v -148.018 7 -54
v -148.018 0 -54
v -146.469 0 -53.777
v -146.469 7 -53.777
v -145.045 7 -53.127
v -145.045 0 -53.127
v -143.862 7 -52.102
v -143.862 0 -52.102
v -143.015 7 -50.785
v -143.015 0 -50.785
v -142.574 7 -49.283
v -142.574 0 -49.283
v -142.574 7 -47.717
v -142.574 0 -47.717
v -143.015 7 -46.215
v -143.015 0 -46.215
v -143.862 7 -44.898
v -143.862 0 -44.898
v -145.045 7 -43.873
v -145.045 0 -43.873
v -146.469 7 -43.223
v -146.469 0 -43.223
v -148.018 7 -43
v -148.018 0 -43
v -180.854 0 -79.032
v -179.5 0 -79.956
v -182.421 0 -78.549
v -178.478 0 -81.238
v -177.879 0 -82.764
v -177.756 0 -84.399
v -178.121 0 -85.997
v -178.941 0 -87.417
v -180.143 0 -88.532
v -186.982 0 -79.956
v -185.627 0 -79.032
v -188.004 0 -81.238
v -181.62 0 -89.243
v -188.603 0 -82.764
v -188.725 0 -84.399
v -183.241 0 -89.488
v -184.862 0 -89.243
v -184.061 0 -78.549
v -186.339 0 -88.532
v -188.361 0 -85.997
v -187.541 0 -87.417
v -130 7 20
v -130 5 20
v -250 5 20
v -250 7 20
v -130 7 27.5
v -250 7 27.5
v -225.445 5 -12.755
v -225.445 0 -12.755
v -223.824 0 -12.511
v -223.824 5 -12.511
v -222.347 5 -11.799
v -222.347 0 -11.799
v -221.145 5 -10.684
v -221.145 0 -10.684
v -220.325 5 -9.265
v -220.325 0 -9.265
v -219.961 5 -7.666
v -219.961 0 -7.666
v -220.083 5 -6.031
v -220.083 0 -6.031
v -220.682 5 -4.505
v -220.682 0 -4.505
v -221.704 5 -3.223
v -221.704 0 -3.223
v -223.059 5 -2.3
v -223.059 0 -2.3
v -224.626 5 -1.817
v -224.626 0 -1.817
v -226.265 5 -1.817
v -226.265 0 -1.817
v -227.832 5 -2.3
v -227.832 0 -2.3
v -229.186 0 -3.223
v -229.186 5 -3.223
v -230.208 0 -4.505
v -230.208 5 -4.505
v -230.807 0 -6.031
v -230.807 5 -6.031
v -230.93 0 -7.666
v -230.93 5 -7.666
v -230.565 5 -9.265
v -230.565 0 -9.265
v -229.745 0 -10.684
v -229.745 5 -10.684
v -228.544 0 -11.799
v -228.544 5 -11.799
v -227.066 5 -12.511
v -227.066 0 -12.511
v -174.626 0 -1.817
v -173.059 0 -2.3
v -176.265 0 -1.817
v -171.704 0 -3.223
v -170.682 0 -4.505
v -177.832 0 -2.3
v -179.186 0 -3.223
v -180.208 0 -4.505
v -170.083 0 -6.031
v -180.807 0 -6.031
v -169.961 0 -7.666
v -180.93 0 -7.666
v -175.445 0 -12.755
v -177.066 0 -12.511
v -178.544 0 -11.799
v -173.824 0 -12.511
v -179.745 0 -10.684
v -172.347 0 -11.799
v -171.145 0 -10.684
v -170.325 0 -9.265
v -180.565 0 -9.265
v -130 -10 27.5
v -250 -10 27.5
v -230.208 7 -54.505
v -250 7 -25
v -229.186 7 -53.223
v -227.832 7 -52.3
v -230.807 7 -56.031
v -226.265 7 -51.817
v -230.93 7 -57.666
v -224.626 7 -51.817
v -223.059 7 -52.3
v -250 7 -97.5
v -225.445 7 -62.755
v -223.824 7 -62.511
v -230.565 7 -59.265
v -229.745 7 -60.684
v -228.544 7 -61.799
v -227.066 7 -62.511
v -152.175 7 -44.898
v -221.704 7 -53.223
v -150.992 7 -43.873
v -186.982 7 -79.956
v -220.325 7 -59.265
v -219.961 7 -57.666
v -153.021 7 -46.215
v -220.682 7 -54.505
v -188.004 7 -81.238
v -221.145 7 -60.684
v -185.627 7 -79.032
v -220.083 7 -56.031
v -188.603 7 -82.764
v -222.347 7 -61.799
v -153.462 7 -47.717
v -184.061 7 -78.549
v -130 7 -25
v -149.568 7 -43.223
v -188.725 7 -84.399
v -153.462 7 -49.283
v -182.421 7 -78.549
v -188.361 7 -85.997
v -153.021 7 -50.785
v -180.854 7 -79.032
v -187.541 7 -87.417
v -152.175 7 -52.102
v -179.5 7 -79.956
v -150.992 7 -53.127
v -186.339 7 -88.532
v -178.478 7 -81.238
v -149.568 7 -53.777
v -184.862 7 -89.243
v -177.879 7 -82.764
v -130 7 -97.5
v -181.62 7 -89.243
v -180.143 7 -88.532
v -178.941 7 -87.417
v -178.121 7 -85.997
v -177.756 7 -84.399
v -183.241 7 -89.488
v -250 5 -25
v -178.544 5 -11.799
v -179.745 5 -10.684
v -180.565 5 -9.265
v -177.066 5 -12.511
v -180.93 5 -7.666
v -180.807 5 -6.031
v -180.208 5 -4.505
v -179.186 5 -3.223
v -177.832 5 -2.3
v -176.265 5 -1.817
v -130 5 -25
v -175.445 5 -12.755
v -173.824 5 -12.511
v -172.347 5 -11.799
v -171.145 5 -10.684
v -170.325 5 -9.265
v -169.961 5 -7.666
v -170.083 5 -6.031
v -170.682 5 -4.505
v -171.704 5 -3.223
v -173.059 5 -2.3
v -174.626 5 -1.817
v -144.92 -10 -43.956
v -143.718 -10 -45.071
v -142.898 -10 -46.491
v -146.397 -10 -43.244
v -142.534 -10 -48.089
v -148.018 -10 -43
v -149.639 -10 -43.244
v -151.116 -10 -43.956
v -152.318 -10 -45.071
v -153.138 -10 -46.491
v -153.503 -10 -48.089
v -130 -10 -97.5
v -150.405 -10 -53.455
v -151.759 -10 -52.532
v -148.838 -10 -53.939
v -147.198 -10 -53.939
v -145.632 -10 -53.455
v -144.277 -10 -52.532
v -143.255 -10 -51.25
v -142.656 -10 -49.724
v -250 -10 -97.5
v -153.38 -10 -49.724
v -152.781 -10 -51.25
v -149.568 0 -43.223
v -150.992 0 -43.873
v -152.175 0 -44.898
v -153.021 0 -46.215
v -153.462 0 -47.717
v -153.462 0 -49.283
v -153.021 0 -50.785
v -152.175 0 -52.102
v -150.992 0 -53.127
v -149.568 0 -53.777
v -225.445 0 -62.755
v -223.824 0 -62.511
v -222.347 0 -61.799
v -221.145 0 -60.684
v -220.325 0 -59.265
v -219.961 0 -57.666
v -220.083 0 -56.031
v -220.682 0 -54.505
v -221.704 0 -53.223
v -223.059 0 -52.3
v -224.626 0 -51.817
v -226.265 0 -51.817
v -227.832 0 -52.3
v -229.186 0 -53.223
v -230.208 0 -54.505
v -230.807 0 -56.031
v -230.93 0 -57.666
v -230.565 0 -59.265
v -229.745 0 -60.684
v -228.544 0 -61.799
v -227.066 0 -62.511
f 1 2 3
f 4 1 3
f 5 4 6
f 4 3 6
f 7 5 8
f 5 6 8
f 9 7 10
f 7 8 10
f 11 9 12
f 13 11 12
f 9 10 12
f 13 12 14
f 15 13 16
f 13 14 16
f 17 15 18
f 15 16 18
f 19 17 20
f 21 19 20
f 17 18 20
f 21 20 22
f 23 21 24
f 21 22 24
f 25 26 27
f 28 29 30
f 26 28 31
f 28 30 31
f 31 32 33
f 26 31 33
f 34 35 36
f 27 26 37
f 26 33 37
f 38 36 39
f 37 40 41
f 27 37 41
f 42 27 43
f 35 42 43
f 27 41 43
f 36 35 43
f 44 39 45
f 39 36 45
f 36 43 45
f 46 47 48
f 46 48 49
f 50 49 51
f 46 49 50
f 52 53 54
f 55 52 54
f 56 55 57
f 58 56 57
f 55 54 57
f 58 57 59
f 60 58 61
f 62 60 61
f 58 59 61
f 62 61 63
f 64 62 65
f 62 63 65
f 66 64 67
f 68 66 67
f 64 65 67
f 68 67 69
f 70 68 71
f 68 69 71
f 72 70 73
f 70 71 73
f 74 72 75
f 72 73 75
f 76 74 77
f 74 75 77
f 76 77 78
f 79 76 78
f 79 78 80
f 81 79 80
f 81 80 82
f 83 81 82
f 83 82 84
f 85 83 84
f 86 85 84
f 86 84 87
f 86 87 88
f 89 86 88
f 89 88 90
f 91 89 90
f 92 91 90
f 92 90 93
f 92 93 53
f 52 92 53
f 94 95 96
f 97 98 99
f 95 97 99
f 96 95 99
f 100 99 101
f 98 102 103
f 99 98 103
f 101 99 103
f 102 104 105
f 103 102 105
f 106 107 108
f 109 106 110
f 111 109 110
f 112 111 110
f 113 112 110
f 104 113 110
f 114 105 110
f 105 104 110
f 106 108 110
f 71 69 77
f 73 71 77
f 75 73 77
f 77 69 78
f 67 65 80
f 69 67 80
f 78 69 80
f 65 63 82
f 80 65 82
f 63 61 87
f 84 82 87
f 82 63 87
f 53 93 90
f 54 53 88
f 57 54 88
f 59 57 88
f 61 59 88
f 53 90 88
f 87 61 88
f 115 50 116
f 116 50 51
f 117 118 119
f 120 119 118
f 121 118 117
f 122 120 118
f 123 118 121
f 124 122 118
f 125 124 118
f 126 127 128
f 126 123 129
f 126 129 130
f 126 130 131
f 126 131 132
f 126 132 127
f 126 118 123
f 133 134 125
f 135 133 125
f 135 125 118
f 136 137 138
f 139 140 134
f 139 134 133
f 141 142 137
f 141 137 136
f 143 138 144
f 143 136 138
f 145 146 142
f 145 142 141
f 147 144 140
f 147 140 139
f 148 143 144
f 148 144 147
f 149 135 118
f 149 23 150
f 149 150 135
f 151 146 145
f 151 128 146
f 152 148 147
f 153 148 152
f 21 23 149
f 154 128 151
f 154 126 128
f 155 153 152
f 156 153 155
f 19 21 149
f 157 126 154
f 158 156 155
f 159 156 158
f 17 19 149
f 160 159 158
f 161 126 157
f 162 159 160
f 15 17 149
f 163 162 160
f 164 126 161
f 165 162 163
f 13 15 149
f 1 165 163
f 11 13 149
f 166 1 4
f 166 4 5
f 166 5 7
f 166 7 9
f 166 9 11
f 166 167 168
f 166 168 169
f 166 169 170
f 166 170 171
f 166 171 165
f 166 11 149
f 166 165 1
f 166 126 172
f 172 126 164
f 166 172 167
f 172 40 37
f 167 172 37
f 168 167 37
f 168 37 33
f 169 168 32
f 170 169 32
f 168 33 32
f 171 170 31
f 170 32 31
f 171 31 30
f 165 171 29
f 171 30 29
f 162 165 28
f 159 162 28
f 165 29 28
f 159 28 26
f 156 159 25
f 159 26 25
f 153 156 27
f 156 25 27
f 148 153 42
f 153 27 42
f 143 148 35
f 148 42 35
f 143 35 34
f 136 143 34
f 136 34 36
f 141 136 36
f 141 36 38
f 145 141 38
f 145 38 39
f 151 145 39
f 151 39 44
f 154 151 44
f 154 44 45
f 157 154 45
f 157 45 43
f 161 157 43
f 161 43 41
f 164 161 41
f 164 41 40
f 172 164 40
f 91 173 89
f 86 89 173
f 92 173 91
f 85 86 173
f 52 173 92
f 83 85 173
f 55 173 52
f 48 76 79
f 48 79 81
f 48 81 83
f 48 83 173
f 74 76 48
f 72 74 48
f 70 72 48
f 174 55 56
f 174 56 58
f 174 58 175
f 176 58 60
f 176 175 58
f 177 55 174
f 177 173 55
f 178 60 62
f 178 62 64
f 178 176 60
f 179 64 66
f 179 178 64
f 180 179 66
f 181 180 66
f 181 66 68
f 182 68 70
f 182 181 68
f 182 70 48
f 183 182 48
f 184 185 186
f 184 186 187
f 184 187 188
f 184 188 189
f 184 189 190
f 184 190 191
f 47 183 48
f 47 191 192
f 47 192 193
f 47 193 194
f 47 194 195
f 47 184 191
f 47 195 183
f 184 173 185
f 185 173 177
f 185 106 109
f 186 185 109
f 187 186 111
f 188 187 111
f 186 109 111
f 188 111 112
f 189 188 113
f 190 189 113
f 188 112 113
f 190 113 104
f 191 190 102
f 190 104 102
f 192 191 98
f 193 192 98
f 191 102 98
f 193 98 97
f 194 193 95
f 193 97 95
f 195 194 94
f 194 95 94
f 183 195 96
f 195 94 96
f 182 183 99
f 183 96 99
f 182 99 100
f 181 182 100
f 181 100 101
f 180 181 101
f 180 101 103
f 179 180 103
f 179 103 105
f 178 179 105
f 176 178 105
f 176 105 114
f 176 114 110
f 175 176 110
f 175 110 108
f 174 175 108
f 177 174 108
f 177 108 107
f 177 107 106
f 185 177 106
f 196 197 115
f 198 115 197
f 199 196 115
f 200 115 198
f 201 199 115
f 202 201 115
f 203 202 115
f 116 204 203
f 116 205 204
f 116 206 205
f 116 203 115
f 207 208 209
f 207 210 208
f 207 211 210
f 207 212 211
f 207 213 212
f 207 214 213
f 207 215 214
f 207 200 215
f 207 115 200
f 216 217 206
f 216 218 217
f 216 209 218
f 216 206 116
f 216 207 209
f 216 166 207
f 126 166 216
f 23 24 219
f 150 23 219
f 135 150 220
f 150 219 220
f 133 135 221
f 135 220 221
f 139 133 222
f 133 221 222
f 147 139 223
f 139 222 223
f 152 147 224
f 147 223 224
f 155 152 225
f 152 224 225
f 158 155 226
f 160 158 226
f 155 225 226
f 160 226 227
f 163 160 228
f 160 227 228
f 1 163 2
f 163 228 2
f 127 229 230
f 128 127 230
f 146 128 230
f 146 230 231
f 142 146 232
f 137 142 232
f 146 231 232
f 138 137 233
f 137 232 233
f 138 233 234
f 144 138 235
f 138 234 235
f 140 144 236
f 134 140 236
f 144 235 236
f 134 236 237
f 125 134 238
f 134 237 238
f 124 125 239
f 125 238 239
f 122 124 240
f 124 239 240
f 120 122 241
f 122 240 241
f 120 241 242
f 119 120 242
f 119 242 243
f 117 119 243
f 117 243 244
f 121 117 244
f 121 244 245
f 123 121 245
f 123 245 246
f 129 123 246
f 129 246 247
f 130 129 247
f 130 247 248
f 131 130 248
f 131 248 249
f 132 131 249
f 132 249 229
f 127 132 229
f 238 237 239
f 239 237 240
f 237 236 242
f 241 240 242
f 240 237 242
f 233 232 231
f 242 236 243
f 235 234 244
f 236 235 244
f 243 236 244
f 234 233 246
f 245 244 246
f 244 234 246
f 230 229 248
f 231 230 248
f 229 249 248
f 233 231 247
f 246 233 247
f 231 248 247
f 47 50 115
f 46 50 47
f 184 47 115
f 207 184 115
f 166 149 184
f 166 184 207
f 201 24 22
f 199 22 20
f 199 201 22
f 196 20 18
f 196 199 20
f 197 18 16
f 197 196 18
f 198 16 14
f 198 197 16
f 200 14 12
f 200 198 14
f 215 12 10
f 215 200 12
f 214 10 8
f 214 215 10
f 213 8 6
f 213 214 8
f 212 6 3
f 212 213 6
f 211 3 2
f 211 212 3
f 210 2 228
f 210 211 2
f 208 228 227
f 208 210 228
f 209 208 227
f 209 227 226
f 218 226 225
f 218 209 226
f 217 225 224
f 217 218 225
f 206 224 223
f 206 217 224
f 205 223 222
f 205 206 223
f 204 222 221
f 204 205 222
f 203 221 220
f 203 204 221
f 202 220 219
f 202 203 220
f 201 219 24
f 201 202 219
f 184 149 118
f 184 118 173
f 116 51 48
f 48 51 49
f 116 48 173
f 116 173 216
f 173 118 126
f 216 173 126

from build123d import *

# Parameters (mm, degrees)
SKETCH1_W           = 120
SKETCH1_H           = 55
BOSS_EXTRUDE1_DEPTH = 5
SKETCH2_W           = 120
SKETCH2_H           = 7.5
BOSS_EXTRUDE2_DEPTH = 20
SKETCH3_W           = 120
SKETCH3_H           = 2.5
BOSS_EXTRUDE4_DEPTH = 20
BOSS_EXTRUDE5_DEPTH = 190
SKETCH9_W           = 310
SKETCH9_H           = 25
BOSS_EXTRUDE6_DEPTH = 70
SKETCH14_R          = 5.5
CUT_EXTRUDE5_DEPTH  = 153
SKETCH15_W          = 125
SKETCH15_H          = 25
CUT_EXTRUDE6_DEPTH  = 190
SKETCH16_W          = 120
SKETCH16_H          = 125
BOSS_EXTRUDE8_DEPTH = 10
SKETCH17_W          = 120
SKETCH17_H          = 125
CUT_EXTRUDE7_DEPTH  = 18
CUT_EXTRUDE8_START  = -18
SKETCH18_R          = 5.5
CUT_EXTRUDE8_DEPTH  = 18


with BuildPart() as part:
    # Sketch1 → Boss-Extrude1 (new body)
    with BuildSketch(Plane(origin=(0, 0, 0), x_dir=(1, 0, 0), z_dir=(0, 1, 0))):
        Rectangle(SKETCH1_W, SKETCH1_H)
    extrude(amount=BOSS_EXTRUDE1_DEPTH)

    # Sketch2 → Boss-Extrude2 (add)
    with BuildSketch(Plane(origin=(0, 5, 0), x_dir=(1, 0, 0), z_dir=(0, 1, 0))):
        with Locations((0, -23.75)):
            Rectangle(SKETCH2_W, SKETCH2_H)
    extrude(amount=BOSS_EXTRUDE2_DEPTH)

    # Sketch3 → Boss-Extrude4 (add)
    with BuildSketch(Plane(origin=(0, 5, 0), x_dir=(1, 0, 0), z_dir=(0, 1, 0))):
        with Locations((0, 26.25)):
            Rectangle(SKETCH3_W, SKETCH3_H)
    extrude(amount=BOSS_EXTRUDE4_DEPTH)

    # Sketch8 → Boss-Extrude5 (add)
    with BuildSketch(Plane.ZY.offset(60)):
        Polygon((-27.5, 0), (-27.5, 25), (-25, 25), (-25, 5), (20, 5), (20, 25), (27.5, 25), (27.5, 0), align=None)
    extrude(amount=BOSS_EXTRUDE5_DEPTH)

    # Sketch9 → Boss-Extrude6 (add)
    with BuildSketch(Plane(origin=(0, 0, -27.5), x_dir=(-1, 0, 0), z_dir=(0, 0, -1))):
        with Locations((95, 12.5)):
            Rectangle(SKETCH9_W, SKETCH9_H)
    extrude(amount=BOSS_EXTRUDE6_DEPTH)

    # Sketch14 → Cut-Extrude5 (cut)
    with BuildSketch(Plane(origin=(0, 0, 0), x_dir=(-1, 0, 0), z_dir=(0, -1, 0))):
        with Locations(Location((225.445279058, 7.255161462, 0), (0, 0, 90))):
            Circle(SKETCH14_R)
        with Locations(Location((175.445279058, 7.255161462, 0), (0, 0, 90))):
            Circle(SKETCH14_R)
        with Locations(Location((225.445279058, 57.255161462, 0), (0, 0, 90))):
            Circle(SKETCH14_R)
        with Locations(Location((148.0182107, 48.5, 0), (0, 0, 90))):
            Circle(SKETCH14_R)
        with Locations(Location((183.240850763, 83.987541856, 0), (0, 0, 90))):
            Circle(SKETCH14_R)
    extrude(amount=-CUT_EXTRUDE5_DEPTH, mode=Mode.SUBTRACT)

    # Sketch15 → Cut-Extrude6 (cut)
    with BuildSketch(Plane(origin=(60, 0, 0), x_dir=(0, 0, -1), z_dir=(1, 0, 0))):
        with Locations((35, 12.5)):
            Rectangle(SKETCH15_W, SKETCH15_H)
    extrude(amount=-CUT_EXTRUDE6_DEPTH, mode=Mode.SUBTRACT)

    # Sketch16 → Boss-Extrude8 (add)
    with BuildSketch(Plane(origin=(0, 0, 0), x_dir=(-1, 0, 0), z_dir=(0, -1, 0))):
        with Locations((190, 35)):
            Rectangle(SKETCH16_W, SKETCH16_H)
    extrude(amount=BOSS_EXTRUDE8_DEPTH)

    # Sketch17 → Cut-Extrude7 (cut)
    with BuildSketch(Plane(origin=(0, 25, 0), x_dir=(1, 0, 0), z_dir=(0, 1, 0))):
        with Locations((-190, 35)):
            Rectangle(SKETCH17_W, SKETCH17_H)
    extrude(amount=-CUT_EXTRUDE7_DEPTH, mode=Mode.SUBTRACT)

    # Sketch18 → Cut-Extrude8 (cut)
    with BuildSketch(Plane(origin=(0, 7, 0), x_dir=(1, 0, 0), z_dir=(0, 1, 0)).offset(CUT_EXTRUDE8_START)):
        with Locations(Location((-148.0182107, 48.5, 0), (0, 0, 270))):
            Circle(SKETCH18_R)
    extrude(amount=CUT_EXTRUDE8_DEPTH, mode=Mode.SUBTRACT)


solid = part.part
